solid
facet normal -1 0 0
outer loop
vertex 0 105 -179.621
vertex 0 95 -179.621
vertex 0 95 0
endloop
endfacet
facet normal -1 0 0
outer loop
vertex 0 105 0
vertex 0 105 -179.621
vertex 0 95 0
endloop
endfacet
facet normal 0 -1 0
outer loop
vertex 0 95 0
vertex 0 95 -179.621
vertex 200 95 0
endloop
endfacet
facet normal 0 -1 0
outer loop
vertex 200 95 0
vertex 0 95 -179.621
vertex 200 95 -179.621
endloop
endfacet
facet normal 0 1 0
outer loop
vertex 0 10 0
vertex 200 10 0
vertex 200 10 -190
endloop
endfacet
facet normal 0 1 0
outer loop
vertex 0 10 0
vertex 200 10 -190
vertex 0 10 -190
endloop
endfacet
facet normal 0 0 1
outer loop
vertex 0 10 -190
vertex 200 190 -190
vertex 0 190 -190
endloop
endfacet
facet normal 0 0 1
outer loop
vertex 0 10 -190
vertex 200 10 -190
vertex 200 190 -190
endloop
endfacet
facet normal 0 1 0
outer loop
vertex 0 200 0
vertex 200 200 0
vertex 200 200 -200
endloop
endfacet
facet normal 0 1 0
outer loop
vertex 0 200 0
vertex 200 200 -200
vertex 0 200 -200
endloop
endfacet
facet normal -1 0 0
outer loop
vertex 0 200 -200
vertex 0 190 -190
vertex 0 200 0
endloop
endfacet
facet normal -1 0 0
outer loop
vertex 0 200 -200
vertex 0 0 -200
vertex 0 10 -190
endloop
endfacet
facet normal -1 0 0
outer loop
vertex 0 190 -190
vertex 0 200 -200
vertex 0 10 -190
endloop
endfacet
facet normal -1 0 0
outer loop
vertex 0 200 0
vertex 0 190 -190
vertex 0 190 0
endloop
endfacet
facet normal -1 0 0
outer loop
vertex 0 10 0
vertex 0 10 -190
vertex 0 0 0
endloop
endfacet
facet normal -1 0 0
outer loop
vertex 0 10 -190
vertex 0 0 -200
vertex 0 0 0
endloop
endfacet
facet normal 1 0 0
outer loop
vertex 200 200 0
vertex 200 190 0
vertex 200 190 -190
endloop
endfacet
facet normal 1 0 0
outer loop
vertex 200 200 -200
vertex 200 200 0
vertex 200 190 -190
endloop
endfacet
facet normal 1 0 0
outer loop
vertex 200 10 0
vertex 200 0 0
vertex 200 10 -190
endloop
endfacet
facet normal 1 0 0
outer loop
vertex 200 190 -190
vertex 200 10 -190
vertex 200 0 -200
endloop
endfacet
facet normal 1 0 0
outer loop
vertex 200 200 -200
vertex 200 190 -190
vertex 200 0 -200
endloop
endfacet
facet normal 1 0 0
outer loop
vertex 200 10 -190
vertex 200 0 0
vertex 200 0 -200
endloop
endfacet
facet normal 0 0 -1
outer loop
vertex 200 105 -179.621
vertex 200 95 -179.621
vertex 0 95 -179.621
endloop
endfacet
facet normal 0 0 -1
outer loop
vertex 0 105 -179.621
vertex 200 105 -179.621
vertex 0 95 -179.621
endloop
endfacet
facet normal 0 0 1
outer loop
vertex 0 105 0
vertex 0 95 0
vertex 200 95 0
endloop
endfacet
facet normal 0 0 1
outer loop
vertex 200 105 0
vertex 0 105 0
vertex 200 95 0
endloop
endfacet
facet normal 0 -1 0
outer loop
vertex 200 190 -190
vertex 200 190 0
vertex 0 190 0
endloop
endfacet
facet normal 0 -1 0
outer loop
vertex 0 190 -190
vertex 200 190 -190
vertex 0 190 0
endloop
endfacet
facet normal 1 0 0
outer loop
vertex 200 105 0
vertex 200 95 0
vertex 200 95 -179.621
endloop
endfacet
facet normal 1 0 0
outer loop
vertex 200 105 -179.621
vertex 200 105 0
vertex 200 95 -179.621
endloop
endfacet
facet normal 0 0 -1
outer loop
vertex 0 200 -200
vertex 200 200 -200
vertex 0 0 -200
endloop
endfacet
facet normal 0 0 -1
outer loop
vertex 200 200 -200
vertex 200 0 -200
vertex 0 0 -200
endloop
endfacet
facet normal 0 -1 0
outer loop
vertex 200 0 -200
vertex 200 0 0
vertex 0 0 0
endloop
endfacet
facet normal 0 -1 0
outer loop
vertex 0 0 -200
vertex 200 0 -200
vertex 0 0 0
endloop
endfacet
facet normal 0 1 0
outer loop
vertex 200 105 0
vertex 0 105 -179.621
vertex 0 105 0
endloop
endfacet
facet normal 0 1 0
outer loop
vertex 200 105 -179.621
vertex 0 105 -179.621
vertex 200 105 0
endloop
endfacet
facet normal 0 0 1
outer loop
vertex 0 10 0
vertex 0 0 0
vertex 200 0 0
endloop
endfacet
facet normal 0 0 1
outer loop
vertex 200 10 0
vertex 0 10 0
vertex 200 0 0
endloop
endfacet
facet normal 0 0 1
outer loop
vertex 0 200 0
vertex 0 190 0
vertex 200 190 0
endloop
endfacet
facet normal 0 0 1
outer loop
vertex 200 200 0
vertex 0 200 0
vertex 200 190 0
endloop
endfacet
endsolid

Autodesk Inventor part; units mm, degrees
ref_plane "YZ Plane" through (0, 0, 0) normal (1, 0, 0) x (0, 1, 0)
ref_plane "XZ Plane" through (0, 0, 0) normal (0, 1, 0) x (-1, 0, 0)
ref_plane "XY Plane" through (0, 0, 0) normal (0, 0, 1) x (1, 0, 0)
sketch "Sketch1" plane through (0, 0, 0) normal (0, 1, 0) x (-1, 0, 0)
  line L0 (0, 0) -> (-200, 0)
  line L1 (-200, 0) -> (-200, -200)
  line L2 (-200, -200) -> (0, -200)
  line L3 (0, -200) -> (0, 0)
  dimension "d0" = 200
  dimension "d1" = 200
extrude "Extrusion1" add sketch "Sketch1" along normal blind 200
shell "Shell1" thickness 10 removed faces 3 at (66.6667, 66.6667, 0) at (0, 66.6667, -133.3333) at (200, 66.6667, -66.6667)
ref_plane "Work Plane1" through (0, 100, -190) normal (0, 1, 0) x (1, 0, 0)
sketch "Sketch2" plane through (0, 100, -190) normal (0, 1, 0) x (1, 0, 0)
  point P0 (0, -190)
sketch "Sketch3" plane through (0, 100, -190) normal (0, 1, 0) x (1, 0, 0)
  line L0 (0, -190) -> (200, -190)
  line L1 (200, -190) -> (200, -10.3794)
  line L2 (200, -10.3794) -> (0, -10.3794)
  line L3 (0, -10.3794) -> (0, -190)
extrude "Extrusion2" add sketch "Sketch3" along normal mid plane 10
properties part number "Holstrer"
